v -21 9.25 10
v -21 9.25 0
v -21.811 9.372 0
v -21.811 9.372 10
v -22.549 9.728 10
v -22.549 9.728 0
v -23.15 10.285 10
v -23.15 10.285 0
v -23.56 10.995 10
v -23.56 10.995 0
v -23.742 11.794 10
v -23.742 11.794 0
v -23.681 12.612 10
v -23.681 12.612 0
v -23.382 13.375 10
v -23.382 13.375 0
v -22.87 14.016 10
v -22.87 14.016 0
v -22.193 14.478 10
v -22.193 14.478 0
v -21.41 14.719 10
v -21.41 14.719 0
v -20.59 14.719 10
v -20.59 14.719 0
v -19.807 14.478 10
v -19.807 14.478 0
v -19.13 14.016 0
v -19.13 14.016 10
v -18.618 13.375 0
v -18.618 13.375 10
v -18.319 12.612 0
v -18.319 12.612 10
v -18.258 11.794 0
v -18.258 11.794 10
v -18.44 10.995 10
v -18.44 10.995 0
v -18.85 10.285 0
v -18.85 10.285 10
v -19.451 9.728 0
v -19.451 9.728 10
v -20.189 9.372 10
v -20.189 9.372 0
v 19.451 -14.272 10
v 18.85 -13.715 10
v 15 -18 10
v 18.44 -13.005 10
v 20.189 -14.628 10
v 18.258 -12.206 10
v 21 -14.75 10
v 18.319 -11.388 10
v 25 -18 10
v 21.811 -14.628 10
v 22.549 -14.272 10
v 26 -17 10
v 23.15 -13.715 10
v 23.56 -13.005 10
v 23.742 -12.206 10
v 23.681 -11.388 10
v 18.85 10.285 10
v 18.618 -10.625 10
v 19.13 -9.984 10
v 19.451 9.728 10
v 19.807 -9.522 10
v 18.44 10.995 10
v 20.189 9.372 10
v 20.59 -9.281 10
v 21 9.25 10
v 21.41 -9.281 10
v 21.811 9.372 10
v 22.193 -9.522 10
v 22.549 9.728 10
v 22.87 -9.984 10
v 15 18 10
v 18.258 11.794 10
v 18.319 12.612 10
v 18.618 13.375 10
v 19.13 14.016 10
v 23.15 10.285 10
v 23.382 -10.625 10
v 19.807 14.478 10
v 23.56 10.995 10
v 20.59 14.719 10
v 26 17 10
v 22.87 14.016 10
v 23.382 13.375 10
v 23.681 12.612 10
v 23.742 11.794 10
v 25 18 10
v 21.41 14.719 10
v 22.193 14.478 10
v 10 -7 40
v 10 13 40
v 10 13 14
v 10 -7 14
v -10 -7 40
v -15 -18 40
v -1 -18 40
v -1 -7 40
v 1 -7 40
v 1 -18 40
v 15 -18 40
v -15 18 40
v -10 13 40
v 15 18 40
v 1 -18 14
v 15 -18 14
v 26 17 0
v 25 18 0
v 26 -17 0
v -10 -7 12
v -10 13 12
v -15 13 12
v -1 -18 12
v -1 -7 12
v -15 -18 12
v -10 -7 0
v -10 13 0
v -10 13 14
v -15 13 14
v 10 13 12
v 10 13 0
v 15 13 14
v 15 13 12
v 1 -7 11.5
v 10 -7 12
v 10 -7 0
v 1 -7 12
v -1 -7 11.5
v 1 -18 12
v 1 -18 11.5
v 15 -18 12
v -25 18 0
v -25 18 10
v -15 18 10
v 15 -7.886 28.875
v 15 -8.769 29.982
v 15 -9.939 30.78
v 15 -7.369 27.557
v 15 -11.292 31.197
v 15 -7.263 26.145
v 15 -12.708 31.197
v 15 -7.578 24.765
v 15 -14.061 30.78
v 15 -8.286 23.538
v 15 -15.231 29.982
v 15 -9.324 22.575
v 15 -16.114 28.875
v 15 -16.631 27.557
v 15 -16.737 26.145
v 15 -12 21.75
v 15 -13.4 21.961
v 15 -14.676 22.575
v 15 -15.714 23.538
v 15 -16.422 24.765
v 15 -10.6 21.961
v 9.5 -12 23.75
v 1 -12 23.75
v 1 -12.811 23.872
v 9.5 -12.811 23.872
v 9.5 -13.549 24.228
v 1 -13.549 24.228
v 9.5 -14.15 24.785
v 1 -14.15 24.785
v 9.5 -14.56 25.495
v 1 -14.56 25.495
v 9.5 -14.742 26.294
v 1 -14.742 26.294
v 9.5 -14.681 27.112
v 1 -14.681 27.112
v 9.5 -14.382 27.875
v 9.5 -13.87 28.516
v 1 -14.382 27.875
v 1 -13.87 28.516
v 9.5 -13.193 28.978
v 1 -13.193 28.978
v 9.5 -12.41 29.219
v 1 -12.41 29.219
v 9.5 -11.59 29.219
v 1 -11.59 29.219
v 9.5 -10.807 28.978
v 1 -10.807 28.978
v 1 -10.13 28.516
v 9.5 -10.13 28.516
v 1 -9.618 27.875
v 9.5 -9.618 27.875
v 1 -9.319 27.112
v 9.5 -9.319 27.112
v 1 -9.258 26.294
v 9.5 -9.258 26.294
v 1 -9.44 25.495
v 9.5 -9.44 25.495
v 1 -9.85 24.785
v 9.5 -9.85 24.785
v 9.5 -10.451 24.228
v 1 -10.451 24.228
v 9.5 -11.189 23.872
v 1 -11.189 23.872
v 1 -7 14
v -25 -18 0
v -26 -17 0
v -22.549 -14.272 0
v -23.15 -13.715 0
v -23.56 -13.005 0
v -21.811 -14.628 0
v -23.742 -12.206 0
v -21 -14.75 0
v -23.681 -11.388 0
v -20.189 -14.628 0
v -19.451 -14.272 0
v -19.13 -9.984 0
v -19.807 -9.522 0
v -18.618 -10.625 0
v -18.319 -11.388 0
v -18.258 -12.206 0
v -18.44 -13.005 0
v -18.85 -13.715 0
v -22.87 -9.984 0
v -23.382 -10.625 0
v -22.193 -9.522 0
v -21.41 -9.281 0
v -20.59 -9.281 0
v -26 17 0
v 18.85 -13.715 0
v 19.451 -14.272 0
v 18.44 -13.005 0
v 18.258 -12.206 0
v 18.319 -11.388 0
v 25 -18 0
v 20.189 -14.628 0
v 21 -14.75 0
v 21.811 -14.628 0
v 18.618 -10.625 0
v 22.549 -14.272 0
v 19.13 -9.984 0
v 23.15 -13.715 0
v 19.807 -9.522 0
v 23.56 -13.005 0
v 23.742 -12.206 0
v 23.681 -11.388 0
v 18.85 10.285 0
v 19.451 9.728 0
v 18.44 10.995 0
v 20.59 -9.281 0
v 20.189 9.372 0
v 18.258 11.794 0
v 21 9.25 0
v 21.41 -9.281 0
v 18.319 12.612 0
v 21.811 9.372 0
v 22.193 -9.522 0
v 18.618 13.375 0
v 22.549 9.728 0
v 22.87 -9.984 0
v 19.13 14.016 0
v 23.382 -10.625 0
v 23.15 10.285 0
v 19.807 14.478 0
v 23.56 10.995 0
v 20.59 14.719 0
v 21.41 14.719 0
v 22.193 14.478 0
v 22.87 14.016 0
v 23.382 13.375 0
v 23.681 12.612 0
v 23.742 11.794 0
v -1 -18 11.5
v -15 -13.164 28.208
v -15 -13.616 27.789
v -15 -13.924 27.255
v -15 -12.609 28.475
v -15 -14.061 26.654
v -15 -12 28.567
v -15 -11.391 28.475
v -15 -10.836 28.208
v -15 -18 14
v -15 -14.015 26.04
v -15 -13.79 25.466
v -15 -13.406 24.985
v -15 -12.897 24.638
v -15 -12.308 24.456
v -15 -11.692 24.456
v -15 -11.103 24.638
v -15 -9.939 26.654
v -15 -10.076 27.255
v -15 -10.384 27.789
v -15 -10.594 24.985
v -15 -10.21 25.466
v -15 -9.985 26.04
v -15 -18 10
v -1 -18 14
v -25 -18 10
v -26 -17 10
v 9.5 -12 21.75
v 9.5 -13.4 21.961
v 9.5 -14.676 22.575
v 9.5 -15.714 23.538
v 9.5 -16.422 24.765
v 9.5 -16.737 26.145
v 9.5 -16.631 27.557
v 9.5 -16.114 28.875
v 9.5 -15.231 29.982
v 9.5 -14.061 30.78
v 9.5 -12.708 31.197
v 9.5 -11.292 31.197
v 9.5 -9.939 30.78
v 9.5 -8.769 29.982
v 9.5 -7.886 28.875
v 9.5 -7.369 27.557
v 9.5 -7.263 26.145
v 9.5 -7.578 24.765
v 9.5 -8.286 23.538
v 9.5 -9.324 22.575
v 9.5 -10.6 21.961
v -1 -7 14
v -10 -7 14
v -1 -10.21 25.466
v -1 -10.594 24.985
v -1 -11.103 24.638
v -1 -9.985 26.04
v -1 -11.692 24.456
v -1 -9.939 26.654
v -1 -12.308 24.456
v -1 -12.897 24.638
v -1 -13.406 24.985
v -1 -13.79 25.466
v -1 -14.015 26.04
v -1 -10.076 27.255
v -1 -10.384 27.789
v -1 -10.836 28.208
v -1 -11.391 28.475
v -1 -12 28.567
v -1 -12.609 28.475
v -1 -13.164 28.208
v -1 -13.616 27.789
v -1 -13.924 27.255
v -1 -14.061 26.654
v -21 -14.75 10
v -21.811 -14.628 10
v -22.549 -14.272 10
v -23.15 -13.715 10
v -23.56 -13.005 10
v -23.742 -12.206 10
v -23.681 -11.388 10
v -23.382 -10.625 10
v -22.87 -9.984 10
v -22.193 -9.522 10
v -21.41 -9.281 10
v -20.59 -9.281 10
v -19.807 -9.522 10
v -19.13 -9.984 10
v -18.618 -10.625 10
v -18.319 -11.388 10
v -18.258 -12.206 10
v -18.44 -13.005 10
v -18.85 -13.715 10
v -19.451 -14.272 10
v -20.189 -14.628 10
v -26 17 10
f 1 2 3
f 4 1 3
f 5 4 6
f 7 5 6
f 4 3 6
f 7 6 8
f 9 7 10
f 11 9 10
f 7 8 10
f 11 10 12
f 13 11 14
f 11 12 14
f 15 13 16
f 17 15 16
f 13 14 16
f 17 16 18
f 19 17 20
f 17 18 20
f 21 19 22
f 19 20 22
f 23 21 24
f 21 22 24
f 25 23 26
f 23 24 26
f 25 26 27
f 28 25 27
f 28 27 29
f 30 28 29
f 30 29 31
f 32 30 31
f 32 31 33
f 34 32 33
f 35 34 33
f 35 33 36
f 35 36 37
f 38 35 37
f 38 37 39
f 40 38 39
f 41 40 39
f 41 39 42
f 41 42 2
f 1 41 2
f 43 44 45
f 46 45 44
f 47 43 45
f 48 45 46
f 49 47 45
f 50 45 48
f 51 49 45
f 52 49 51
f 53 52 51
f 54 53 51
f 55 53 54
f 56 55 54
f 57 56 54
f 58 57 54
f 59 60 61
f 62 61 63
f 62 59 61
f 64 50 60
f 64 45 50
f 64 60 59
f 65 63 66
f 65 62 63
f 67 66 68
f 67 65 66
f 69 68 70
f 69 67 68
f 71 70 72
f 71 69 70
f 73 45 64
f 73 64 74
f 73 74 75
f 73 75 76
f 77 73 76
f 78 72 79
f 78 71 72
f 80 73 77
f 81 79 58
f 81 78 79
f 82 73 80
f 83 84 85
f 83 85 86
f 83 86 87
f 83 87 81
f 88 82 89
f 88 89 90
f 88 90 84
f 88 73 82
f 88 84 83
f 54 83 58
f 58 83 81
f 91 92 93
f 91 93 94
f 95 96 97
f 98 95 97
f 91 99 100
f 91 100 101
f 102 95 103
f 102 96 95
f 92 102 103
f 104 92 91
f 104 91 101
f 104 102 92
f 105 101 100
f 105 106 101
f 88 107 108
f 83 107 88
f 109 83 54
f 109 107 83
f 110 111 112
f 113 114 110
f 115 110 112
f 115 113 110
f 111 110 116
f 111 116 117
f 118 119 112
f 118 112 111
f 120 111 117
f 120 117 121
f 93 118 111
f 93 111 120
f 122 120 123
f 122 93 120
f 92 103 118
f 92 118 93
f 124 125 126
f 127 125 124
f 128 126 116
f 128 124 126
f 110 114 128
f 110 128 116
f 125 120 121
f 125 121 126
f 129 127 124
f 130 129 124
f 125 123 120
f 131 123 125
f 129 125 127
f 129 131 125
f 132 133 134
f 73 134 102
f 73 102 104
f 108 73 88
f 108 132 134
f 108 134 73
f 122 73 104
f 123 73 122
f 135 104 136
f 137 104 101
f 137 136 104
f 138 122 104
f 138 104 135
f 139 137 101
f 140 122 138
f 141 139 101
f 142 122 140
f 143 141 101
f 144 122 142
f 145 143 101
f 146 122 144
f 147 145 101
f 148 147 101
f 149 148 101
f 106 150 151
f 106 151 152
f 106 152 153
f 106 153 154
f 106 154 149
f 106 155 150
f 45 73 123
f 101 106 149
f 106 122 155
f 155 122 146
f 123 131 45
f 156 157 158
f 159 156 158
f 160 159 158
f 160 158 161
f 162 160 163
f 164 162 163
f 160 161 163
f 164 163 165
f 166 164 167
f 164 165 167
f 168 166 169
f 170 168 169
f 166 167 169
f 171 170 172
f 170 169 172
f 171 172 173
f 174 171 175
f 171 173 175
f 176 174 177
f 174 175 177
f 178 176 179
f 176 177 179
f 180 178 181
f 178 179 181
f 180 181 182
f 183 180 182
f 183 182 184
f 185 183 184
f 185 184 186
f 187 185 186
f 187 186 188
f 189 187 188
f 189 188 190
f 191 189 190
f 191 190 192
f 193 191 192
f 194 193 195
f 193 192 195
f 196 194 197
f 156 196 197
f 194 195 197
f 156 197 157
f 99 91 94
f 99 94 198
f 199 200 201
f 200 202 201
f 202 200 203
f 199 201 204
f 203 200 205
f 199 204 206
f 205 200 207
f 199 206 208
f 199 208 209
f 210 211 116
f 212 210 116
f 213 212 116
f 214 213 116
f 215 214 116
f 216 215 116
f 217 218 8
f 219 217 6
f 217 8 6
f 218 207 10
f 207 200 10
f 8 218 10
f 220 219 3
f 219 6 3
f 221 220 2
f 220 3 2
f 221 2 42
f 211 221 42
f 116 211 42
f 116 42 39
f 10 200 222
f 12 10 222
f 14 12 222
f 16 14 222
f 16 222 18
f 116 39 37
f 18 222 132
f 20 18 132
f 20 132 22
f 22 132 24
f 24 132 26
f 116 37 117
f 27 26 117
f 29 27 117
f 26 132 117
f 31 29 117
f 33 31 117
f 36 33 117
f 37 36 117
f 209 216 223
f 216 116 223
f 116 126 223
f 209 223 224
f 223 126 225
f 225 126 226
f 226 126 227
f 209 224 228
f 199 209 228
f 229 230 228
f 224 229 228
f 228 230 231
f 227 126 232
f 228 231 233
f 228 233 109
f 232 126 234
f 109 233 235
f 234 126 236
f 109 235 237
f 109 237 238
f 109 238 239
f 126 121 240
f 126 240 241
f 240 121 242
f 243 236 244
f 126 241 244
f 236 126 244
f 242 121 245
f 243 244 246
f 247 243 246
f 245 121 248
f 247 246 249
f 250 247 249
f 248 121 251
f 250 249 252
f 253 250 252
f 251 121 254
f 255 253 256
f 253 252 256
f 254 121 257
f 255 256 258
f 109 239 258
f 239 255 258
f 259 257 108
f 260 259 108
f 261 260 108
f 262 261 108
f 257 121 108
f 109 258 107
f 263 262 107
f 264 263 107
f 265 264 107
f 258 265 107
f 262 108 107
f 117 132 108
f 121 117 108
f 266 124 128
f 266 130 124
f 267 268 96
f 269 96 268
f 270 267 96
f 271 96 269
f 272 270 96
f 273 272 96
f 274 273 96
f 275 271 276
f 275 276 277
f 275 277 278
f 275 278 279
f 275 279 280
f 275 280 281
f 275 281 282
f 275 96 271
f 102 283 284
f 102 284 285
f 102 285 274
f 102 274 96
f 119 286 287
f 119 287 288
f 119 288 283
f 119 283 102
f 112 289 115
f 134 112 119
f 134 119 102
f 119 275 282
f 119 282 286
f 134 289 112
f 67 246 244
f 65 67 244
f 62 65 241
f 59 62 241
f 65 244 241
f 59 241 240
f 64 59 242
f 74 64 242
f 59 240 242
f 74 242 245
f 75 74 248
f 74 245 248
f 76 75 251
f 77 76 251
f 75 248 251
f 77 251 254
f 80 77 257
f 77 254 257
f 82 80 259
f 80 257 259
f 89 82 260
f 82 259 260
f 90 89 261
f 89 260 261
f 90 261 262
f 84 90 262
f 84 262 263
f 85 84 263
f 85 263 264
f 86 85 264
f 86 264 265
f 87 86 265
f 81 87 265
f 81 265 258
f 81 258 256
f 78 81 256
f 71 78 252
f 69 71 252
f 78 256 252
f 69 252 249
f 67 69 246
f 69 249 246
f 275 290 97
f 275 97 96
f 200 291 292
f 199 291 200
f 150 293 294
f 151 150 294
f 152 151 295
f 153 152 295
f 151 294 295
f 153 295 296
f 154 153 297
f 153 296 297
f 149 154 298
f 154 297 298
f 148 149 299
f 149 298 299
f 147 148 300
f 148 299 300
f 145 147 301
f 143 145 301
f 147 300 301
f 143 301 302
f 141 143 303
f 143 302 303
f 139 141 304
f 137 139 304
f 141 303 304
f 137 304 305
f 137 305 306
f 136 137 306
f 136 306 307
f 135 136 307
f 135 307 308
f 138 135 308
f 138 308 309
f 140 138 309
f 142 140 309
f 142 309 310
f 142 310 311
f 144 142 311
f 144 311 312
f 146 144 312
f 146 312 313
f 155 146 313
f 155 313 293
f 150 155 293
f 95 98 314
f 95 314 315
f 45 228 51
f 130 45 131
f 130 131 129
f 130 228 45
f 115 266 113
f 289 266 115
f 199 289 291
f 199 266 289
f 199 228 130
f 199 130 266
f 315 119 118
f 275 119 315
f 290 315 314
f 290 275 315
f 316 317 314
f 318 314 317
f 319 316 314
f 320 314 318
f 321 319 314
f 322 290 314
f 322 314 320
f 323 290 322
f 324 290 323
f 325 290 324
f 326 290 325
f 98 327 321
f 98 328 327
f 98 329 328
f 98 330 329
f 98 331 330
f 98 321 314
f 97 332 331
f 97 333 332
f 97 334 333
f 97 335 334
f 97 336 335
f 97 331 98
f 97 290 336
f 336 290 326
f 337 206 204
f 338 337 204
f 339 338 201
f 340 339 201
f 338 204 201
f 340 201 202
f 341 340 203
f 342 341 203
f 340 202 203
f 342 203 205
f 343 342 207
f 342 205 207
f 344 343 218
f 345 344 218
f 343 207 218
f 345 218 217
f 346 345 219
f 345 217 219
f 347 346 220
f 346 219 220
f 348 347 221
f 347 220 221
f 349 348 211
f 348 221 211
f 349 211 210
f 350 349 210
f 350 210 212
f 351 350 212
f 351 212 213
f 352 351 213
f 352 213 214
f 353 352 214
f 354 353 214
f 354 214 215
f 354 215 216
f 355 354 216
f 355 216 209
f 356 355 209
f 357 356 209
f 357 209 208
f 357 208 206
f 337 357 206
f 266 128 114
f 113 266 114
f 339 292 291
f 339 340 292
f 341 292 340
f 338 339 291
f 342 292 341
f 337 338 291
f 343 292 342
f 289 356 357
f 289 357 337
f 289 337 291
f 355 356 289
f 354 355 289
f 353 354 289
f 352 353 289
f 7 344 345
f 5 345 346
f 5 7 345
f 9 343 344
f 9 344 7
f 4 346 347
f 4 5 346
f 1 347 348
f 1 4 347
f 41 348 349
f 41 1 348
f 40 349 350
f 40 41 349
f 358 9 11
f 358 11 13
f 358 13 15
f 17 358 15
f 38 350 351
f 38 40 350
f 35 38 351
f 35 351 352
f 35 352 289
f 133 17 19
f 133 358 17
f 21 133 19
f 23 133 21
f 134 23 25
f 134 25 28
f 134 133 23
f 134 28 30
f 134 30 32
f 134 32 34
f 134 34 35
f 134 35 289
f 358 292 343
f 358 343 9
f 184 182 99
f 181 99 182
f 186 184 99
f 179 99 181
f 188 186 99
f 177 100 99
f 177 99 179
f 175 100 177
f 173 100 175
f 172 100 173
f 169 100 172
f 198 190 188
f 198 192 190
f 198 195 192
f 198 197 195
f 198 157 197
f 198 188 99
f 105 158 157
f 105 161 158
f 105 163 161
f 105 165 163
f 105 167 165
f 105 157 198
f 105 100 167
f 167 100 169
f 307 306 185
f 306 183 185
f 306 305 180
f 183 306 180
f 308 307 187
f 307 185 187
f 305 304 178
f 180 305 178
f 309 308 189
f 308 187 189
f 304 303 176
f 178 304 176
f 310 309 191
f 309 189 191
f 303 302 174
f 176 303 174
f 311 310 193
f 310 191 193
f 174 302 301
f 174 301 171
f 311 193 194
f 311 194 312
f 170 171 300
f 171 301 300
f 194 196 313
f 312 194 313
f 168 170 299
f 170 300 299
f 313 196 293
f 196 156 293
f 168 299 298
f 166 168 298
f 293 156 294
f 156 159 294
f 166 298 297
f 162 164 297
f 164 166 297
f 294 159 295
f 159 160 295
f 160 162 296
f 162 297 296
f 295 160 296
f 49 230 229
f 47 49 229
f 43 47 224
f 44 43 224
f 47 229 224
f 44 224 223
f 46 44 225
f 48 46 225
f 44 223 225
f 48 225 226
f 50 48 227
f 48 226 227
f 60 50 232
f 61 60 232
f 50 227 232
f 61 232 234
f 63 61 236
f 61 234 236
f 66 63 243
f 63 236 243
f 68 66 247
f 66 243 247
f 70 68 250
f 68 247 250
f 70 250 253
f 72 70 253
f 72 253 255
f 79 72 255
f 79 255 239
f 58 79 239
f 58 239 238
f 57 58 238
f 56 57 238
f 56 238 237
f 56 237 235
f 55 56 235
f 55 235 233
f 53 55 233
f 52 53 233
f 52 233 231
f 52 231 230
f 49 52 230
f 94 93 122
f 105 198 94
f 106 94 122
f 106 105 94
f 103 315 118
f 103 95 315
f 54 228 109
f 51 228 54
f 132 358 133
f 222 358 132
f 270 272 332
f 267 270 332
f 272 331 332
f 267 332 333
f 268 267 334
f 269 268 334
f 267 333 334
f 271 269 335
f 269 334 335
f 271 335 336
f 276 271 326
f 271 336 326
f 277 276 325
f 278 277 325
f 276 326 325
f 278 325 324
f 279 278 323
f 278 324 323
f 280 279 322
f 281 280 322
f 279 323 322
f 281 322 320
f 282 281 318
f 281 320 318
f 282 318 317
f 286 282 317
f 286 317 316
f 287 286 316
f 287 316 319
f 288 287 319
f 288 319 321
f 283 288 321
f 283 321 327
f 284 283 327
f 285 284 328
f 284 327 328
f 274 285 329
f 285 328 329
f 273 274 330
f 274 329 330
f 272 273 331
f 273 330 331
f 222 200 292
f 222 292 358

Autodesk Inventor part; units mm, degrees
ref_plane "YZ Plane" through (0, 0, 0) normal (1, 0, 0) x (0, 1, 0)
ref_plane "XZ Plane" through (0, 0, 0) normal (0, 1, 0) x (-1, 0, 0)
ref_plane "XY Plane" through (0, 0, 0) normal (0, 0, 1) x (1, 0, 0)
sketch "スケッチ1" plane through (0, 0, 0) normal (0, 0, 1) x (1, 0, 0)
  line L0 (-26, 18) -> (26, 18)
  line L1 (26, 18) -> (26, -18)
  line L2 (26, -18) -> (-26, -18)
  line L3 (-26, -18) -> (-26, 18)
  point P0 (0, 0)
  point P1 (0, -18)
  point P2 (-26, 0)
  dimension "d0" = 52
  dimension "d1" = 36
extrude "押し出し1" add sketch "スケッチ1" along normal blind 10
sketch "スケッチ2" plane through (0, 0, 10) normal (0, 0, 1) x (1, 0, 0)
  line L0 (-26, 18) -> (26, 18) projected
  line L1 (26, -18) -> (-26, -18) projected
  line L2 (-15, 18) -> (15, 18)
  line L3 (15, 18) -> (15, -18)
  line L4 (15, -18) -> (-15, -18)
  line L5 (-15, -18) -> (-15, 18)
  point P0 (0, 0)
  point P1 (0, -18)
  point P2 (0, -18)
  dimension "d4" = 30
extrude "押し出し2" add sketch "スケッチ2" along normal blind 30
sketch "スケッチ3" plane through (0, 0, 40) normal (0, 0, 1) x (1, 0, 0)
  line L0 (15, -18) -> (-15, -18) projected
  line L1 (-10, 13) -> (10, 13)
  line L2 (10, 13) -> (10, -7)
  line L3 (10, -7) -> (-10, -7)
  line L4 (-10, -7) -> (-10, 13)
  point P0 (0, 0)
  point P1 (0, -7)
  dimension "d7" = 20
  dimension "d8" = 20
  dimension "d9" = 11
extrude "押し出し3" cut sketch "スケッチ3" against normal through all
sketch "スケッチ4" plane through (0, 0, 10) normal (0, 0, 1) x (1, 0, 0)
  point P0 (0, 0)
  point P1 (-21, -12)
  dimension "d12" = 12
  dimension "d13" = 21
hole "穴1" at (-21, -12, 10) direction (0, 0, -1) diameter 5.5 end through all
pattern_linear "矩形状パターン1" count 2 spacing 42 along (1, 0, 0) count 2 spacing 24 along (0, 1, 0) of "穴1"
sketch "スケッチ5" plane through (-26, -18, 0) normal (0, -1, 0) x (1, 0, 0)
  line L0 (41, 10) -> (41, 40) projected
  line L1 (41, 40) -> (11, 40) projected
  line L2 (11, 10) -> (11, 40) projected
  line L3 (52, 0) -> (0, 0) projected
  line L4 (11, 14) -> (41, 14)
  line L5 (41, 14) -> (41, 12)
  line L6 (41, 12) -> (11, 12)
  line L7 (11, 12) -> (11, 14)
  line L8 (25, 40) -> (27, 40)
  line L9 (27, 40) -> (27, 11.5)
  line L10 (27, 11.5) -> (25, 11.5)
  line L11 (25, 11.5) -> (25, 40)
  point P0 (26, 0)
  point P1 (26, 11.5)
  point P2 (26, 0)
  dimension "d27" = 12
  dimension "d28" = 2
  dimension "d29" = 2
  dimension "d30" = 0.5
extrude "押し出し4" cut sketch "スケッチ5" against normal up to surface (11 mm away) contours L6 L9 L4 L0 | L9 L10 L11 L6 | L6 L11 L4 L9 | L4 L11 L1 L9 | L6 L2 L4 L11
sketch "スケッチ6" plane through (-15, -7, 14) normal (0, -1, 0) x (1, 0, 0)
  line L0 (5, 0) -> (5, -2) projected
  line L1 (0, 0) -> (5, 0) projected
  line L2 (0, -2) -> (0, 0) projected
  line L3 (5, -2) -> (0, -2) projected
  line L4 (25, 0) -> (25, -2) projected
  line L5 (30, -2) -> (25, -2) projected
  line L6 (30, 0) -> (30, -2) projected
  line L7 (25, 0) -> (30, 0) projected
  point P0 (15, -14)
extrude "押し出し5" cut sketch "スケッチ6" against normal up to surface (20 mm away)
sketch "スケッチ7" plane through (15, -18, 10) normal (1, 0, 0) x (0, 0, -1)
  line L0 (-4, 0) -> (-30, 0) projected
  line L1 (10, 36) -> (10, 0) projected
  point P0 (10, 18)
  point P1 (-16.5, 6)
  dimension "d35" = 26.5
  dimension "d36" = 6
hole "穴2" at (15, -12, 26.5) direction (-1, 0, 0) diameter 5.5 end up to surface counterbore diameter 9.5 counterbore depth 5.5
sketch "スケッチ8" plane through (-15, -18, 10) normal (-1, 0, 0) x (0, 0, 1)
  circle A0 centre (16.5, 6) radius 2.75 projected
  point P0 (-10, 18)
hole "穴3" at (-15, -12, 26.5) direction (1, 0, 0) diameter 4.134 end up to surface thread size "M5x0.8" class "6H" standard "ANSI Metric M Profile"
chamfer "面取り1" distance 1 angle 45 4 edges at (-26, 18, 5) (-26, -18, 5) (26, 18, 5) (26, -18, 5)
equation "\"d8\" = d7"
properties part number "CLQAM20" material "MISUMI"
